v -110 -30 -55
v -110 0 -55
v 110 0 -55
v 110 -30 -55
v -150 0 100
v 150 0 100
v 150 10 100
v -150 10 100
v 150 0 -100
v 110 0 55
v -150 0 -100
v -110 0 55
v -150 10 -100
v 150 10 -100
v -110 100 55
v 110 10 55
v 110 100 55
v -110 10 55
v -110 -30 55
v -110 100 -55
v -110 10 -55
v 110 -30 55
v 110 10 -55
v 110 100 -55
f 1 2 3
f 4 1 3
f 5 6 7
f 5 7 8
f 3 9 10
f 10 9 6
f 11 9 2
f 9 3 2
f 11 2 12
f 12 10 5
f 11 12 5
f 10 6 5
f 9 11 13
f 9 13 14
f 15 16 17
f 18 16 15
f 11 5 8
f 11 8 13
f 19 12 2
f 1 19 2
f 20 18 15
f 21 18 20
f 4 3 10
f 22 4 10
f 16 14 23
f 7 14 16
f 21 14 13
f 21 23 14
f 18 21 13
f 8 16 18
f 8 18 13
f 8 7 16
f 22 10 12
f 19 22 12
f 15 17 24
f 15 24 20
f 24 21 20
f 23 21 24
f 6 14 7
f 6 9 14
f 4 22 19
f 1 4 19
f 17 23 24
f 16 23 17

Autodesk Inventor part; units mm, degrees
ref_plane "YZ Plane" through (0, 0, 0) normal (1, 0, 0) x (0, 1, 0)
ref_plane "XZ Plane" through (0, 0, 0) normal (0, 1, 0) x (-1, 0, 0)
ref_plane "XY Plane" through (0, 0, 0) normal (0, 0, 1) x (1, 0, 0)
sketch "Sketch1" plane through (0, 0, 0) normal (0, 1, 0) x (-1, 0, 0)
  line L0 (-150, 100) -> (150, 100)
  line L1 (150, 100) -> (150, -100)
  line L2 (150, -100) -> (-150, -100)
  line L3 (-150, -100) -> (-150, 100)
  line L4 (-110, 55) -> (110, 55)
  line L5 (110, 55) -> (110, -55)
  line L6 (110, -55) -> (-110, -55)
  line L7 (-110, -55) -> (-110, 55)
  line L8 (-110, 55) -> (110, -55) construction
  line L9 (110, 55) -> (-110, -55) construction
  point P0 (0, 0)
  dimension "d0" = 300
  dimension "d1" = 200
  dimension "d3" = 220
  dimension "d4" = 110
extrude "Extrusion1" add sketch "Sketch1" along normal blind 10
extrude "Extrusion2" add sketch "Sketch1" along normal blind 100 contours L4 L5 L6 L7
extrude "Extrusion3" add sketch "Sketch1" against normal blind 30 contours L4 L5 L6 L7
